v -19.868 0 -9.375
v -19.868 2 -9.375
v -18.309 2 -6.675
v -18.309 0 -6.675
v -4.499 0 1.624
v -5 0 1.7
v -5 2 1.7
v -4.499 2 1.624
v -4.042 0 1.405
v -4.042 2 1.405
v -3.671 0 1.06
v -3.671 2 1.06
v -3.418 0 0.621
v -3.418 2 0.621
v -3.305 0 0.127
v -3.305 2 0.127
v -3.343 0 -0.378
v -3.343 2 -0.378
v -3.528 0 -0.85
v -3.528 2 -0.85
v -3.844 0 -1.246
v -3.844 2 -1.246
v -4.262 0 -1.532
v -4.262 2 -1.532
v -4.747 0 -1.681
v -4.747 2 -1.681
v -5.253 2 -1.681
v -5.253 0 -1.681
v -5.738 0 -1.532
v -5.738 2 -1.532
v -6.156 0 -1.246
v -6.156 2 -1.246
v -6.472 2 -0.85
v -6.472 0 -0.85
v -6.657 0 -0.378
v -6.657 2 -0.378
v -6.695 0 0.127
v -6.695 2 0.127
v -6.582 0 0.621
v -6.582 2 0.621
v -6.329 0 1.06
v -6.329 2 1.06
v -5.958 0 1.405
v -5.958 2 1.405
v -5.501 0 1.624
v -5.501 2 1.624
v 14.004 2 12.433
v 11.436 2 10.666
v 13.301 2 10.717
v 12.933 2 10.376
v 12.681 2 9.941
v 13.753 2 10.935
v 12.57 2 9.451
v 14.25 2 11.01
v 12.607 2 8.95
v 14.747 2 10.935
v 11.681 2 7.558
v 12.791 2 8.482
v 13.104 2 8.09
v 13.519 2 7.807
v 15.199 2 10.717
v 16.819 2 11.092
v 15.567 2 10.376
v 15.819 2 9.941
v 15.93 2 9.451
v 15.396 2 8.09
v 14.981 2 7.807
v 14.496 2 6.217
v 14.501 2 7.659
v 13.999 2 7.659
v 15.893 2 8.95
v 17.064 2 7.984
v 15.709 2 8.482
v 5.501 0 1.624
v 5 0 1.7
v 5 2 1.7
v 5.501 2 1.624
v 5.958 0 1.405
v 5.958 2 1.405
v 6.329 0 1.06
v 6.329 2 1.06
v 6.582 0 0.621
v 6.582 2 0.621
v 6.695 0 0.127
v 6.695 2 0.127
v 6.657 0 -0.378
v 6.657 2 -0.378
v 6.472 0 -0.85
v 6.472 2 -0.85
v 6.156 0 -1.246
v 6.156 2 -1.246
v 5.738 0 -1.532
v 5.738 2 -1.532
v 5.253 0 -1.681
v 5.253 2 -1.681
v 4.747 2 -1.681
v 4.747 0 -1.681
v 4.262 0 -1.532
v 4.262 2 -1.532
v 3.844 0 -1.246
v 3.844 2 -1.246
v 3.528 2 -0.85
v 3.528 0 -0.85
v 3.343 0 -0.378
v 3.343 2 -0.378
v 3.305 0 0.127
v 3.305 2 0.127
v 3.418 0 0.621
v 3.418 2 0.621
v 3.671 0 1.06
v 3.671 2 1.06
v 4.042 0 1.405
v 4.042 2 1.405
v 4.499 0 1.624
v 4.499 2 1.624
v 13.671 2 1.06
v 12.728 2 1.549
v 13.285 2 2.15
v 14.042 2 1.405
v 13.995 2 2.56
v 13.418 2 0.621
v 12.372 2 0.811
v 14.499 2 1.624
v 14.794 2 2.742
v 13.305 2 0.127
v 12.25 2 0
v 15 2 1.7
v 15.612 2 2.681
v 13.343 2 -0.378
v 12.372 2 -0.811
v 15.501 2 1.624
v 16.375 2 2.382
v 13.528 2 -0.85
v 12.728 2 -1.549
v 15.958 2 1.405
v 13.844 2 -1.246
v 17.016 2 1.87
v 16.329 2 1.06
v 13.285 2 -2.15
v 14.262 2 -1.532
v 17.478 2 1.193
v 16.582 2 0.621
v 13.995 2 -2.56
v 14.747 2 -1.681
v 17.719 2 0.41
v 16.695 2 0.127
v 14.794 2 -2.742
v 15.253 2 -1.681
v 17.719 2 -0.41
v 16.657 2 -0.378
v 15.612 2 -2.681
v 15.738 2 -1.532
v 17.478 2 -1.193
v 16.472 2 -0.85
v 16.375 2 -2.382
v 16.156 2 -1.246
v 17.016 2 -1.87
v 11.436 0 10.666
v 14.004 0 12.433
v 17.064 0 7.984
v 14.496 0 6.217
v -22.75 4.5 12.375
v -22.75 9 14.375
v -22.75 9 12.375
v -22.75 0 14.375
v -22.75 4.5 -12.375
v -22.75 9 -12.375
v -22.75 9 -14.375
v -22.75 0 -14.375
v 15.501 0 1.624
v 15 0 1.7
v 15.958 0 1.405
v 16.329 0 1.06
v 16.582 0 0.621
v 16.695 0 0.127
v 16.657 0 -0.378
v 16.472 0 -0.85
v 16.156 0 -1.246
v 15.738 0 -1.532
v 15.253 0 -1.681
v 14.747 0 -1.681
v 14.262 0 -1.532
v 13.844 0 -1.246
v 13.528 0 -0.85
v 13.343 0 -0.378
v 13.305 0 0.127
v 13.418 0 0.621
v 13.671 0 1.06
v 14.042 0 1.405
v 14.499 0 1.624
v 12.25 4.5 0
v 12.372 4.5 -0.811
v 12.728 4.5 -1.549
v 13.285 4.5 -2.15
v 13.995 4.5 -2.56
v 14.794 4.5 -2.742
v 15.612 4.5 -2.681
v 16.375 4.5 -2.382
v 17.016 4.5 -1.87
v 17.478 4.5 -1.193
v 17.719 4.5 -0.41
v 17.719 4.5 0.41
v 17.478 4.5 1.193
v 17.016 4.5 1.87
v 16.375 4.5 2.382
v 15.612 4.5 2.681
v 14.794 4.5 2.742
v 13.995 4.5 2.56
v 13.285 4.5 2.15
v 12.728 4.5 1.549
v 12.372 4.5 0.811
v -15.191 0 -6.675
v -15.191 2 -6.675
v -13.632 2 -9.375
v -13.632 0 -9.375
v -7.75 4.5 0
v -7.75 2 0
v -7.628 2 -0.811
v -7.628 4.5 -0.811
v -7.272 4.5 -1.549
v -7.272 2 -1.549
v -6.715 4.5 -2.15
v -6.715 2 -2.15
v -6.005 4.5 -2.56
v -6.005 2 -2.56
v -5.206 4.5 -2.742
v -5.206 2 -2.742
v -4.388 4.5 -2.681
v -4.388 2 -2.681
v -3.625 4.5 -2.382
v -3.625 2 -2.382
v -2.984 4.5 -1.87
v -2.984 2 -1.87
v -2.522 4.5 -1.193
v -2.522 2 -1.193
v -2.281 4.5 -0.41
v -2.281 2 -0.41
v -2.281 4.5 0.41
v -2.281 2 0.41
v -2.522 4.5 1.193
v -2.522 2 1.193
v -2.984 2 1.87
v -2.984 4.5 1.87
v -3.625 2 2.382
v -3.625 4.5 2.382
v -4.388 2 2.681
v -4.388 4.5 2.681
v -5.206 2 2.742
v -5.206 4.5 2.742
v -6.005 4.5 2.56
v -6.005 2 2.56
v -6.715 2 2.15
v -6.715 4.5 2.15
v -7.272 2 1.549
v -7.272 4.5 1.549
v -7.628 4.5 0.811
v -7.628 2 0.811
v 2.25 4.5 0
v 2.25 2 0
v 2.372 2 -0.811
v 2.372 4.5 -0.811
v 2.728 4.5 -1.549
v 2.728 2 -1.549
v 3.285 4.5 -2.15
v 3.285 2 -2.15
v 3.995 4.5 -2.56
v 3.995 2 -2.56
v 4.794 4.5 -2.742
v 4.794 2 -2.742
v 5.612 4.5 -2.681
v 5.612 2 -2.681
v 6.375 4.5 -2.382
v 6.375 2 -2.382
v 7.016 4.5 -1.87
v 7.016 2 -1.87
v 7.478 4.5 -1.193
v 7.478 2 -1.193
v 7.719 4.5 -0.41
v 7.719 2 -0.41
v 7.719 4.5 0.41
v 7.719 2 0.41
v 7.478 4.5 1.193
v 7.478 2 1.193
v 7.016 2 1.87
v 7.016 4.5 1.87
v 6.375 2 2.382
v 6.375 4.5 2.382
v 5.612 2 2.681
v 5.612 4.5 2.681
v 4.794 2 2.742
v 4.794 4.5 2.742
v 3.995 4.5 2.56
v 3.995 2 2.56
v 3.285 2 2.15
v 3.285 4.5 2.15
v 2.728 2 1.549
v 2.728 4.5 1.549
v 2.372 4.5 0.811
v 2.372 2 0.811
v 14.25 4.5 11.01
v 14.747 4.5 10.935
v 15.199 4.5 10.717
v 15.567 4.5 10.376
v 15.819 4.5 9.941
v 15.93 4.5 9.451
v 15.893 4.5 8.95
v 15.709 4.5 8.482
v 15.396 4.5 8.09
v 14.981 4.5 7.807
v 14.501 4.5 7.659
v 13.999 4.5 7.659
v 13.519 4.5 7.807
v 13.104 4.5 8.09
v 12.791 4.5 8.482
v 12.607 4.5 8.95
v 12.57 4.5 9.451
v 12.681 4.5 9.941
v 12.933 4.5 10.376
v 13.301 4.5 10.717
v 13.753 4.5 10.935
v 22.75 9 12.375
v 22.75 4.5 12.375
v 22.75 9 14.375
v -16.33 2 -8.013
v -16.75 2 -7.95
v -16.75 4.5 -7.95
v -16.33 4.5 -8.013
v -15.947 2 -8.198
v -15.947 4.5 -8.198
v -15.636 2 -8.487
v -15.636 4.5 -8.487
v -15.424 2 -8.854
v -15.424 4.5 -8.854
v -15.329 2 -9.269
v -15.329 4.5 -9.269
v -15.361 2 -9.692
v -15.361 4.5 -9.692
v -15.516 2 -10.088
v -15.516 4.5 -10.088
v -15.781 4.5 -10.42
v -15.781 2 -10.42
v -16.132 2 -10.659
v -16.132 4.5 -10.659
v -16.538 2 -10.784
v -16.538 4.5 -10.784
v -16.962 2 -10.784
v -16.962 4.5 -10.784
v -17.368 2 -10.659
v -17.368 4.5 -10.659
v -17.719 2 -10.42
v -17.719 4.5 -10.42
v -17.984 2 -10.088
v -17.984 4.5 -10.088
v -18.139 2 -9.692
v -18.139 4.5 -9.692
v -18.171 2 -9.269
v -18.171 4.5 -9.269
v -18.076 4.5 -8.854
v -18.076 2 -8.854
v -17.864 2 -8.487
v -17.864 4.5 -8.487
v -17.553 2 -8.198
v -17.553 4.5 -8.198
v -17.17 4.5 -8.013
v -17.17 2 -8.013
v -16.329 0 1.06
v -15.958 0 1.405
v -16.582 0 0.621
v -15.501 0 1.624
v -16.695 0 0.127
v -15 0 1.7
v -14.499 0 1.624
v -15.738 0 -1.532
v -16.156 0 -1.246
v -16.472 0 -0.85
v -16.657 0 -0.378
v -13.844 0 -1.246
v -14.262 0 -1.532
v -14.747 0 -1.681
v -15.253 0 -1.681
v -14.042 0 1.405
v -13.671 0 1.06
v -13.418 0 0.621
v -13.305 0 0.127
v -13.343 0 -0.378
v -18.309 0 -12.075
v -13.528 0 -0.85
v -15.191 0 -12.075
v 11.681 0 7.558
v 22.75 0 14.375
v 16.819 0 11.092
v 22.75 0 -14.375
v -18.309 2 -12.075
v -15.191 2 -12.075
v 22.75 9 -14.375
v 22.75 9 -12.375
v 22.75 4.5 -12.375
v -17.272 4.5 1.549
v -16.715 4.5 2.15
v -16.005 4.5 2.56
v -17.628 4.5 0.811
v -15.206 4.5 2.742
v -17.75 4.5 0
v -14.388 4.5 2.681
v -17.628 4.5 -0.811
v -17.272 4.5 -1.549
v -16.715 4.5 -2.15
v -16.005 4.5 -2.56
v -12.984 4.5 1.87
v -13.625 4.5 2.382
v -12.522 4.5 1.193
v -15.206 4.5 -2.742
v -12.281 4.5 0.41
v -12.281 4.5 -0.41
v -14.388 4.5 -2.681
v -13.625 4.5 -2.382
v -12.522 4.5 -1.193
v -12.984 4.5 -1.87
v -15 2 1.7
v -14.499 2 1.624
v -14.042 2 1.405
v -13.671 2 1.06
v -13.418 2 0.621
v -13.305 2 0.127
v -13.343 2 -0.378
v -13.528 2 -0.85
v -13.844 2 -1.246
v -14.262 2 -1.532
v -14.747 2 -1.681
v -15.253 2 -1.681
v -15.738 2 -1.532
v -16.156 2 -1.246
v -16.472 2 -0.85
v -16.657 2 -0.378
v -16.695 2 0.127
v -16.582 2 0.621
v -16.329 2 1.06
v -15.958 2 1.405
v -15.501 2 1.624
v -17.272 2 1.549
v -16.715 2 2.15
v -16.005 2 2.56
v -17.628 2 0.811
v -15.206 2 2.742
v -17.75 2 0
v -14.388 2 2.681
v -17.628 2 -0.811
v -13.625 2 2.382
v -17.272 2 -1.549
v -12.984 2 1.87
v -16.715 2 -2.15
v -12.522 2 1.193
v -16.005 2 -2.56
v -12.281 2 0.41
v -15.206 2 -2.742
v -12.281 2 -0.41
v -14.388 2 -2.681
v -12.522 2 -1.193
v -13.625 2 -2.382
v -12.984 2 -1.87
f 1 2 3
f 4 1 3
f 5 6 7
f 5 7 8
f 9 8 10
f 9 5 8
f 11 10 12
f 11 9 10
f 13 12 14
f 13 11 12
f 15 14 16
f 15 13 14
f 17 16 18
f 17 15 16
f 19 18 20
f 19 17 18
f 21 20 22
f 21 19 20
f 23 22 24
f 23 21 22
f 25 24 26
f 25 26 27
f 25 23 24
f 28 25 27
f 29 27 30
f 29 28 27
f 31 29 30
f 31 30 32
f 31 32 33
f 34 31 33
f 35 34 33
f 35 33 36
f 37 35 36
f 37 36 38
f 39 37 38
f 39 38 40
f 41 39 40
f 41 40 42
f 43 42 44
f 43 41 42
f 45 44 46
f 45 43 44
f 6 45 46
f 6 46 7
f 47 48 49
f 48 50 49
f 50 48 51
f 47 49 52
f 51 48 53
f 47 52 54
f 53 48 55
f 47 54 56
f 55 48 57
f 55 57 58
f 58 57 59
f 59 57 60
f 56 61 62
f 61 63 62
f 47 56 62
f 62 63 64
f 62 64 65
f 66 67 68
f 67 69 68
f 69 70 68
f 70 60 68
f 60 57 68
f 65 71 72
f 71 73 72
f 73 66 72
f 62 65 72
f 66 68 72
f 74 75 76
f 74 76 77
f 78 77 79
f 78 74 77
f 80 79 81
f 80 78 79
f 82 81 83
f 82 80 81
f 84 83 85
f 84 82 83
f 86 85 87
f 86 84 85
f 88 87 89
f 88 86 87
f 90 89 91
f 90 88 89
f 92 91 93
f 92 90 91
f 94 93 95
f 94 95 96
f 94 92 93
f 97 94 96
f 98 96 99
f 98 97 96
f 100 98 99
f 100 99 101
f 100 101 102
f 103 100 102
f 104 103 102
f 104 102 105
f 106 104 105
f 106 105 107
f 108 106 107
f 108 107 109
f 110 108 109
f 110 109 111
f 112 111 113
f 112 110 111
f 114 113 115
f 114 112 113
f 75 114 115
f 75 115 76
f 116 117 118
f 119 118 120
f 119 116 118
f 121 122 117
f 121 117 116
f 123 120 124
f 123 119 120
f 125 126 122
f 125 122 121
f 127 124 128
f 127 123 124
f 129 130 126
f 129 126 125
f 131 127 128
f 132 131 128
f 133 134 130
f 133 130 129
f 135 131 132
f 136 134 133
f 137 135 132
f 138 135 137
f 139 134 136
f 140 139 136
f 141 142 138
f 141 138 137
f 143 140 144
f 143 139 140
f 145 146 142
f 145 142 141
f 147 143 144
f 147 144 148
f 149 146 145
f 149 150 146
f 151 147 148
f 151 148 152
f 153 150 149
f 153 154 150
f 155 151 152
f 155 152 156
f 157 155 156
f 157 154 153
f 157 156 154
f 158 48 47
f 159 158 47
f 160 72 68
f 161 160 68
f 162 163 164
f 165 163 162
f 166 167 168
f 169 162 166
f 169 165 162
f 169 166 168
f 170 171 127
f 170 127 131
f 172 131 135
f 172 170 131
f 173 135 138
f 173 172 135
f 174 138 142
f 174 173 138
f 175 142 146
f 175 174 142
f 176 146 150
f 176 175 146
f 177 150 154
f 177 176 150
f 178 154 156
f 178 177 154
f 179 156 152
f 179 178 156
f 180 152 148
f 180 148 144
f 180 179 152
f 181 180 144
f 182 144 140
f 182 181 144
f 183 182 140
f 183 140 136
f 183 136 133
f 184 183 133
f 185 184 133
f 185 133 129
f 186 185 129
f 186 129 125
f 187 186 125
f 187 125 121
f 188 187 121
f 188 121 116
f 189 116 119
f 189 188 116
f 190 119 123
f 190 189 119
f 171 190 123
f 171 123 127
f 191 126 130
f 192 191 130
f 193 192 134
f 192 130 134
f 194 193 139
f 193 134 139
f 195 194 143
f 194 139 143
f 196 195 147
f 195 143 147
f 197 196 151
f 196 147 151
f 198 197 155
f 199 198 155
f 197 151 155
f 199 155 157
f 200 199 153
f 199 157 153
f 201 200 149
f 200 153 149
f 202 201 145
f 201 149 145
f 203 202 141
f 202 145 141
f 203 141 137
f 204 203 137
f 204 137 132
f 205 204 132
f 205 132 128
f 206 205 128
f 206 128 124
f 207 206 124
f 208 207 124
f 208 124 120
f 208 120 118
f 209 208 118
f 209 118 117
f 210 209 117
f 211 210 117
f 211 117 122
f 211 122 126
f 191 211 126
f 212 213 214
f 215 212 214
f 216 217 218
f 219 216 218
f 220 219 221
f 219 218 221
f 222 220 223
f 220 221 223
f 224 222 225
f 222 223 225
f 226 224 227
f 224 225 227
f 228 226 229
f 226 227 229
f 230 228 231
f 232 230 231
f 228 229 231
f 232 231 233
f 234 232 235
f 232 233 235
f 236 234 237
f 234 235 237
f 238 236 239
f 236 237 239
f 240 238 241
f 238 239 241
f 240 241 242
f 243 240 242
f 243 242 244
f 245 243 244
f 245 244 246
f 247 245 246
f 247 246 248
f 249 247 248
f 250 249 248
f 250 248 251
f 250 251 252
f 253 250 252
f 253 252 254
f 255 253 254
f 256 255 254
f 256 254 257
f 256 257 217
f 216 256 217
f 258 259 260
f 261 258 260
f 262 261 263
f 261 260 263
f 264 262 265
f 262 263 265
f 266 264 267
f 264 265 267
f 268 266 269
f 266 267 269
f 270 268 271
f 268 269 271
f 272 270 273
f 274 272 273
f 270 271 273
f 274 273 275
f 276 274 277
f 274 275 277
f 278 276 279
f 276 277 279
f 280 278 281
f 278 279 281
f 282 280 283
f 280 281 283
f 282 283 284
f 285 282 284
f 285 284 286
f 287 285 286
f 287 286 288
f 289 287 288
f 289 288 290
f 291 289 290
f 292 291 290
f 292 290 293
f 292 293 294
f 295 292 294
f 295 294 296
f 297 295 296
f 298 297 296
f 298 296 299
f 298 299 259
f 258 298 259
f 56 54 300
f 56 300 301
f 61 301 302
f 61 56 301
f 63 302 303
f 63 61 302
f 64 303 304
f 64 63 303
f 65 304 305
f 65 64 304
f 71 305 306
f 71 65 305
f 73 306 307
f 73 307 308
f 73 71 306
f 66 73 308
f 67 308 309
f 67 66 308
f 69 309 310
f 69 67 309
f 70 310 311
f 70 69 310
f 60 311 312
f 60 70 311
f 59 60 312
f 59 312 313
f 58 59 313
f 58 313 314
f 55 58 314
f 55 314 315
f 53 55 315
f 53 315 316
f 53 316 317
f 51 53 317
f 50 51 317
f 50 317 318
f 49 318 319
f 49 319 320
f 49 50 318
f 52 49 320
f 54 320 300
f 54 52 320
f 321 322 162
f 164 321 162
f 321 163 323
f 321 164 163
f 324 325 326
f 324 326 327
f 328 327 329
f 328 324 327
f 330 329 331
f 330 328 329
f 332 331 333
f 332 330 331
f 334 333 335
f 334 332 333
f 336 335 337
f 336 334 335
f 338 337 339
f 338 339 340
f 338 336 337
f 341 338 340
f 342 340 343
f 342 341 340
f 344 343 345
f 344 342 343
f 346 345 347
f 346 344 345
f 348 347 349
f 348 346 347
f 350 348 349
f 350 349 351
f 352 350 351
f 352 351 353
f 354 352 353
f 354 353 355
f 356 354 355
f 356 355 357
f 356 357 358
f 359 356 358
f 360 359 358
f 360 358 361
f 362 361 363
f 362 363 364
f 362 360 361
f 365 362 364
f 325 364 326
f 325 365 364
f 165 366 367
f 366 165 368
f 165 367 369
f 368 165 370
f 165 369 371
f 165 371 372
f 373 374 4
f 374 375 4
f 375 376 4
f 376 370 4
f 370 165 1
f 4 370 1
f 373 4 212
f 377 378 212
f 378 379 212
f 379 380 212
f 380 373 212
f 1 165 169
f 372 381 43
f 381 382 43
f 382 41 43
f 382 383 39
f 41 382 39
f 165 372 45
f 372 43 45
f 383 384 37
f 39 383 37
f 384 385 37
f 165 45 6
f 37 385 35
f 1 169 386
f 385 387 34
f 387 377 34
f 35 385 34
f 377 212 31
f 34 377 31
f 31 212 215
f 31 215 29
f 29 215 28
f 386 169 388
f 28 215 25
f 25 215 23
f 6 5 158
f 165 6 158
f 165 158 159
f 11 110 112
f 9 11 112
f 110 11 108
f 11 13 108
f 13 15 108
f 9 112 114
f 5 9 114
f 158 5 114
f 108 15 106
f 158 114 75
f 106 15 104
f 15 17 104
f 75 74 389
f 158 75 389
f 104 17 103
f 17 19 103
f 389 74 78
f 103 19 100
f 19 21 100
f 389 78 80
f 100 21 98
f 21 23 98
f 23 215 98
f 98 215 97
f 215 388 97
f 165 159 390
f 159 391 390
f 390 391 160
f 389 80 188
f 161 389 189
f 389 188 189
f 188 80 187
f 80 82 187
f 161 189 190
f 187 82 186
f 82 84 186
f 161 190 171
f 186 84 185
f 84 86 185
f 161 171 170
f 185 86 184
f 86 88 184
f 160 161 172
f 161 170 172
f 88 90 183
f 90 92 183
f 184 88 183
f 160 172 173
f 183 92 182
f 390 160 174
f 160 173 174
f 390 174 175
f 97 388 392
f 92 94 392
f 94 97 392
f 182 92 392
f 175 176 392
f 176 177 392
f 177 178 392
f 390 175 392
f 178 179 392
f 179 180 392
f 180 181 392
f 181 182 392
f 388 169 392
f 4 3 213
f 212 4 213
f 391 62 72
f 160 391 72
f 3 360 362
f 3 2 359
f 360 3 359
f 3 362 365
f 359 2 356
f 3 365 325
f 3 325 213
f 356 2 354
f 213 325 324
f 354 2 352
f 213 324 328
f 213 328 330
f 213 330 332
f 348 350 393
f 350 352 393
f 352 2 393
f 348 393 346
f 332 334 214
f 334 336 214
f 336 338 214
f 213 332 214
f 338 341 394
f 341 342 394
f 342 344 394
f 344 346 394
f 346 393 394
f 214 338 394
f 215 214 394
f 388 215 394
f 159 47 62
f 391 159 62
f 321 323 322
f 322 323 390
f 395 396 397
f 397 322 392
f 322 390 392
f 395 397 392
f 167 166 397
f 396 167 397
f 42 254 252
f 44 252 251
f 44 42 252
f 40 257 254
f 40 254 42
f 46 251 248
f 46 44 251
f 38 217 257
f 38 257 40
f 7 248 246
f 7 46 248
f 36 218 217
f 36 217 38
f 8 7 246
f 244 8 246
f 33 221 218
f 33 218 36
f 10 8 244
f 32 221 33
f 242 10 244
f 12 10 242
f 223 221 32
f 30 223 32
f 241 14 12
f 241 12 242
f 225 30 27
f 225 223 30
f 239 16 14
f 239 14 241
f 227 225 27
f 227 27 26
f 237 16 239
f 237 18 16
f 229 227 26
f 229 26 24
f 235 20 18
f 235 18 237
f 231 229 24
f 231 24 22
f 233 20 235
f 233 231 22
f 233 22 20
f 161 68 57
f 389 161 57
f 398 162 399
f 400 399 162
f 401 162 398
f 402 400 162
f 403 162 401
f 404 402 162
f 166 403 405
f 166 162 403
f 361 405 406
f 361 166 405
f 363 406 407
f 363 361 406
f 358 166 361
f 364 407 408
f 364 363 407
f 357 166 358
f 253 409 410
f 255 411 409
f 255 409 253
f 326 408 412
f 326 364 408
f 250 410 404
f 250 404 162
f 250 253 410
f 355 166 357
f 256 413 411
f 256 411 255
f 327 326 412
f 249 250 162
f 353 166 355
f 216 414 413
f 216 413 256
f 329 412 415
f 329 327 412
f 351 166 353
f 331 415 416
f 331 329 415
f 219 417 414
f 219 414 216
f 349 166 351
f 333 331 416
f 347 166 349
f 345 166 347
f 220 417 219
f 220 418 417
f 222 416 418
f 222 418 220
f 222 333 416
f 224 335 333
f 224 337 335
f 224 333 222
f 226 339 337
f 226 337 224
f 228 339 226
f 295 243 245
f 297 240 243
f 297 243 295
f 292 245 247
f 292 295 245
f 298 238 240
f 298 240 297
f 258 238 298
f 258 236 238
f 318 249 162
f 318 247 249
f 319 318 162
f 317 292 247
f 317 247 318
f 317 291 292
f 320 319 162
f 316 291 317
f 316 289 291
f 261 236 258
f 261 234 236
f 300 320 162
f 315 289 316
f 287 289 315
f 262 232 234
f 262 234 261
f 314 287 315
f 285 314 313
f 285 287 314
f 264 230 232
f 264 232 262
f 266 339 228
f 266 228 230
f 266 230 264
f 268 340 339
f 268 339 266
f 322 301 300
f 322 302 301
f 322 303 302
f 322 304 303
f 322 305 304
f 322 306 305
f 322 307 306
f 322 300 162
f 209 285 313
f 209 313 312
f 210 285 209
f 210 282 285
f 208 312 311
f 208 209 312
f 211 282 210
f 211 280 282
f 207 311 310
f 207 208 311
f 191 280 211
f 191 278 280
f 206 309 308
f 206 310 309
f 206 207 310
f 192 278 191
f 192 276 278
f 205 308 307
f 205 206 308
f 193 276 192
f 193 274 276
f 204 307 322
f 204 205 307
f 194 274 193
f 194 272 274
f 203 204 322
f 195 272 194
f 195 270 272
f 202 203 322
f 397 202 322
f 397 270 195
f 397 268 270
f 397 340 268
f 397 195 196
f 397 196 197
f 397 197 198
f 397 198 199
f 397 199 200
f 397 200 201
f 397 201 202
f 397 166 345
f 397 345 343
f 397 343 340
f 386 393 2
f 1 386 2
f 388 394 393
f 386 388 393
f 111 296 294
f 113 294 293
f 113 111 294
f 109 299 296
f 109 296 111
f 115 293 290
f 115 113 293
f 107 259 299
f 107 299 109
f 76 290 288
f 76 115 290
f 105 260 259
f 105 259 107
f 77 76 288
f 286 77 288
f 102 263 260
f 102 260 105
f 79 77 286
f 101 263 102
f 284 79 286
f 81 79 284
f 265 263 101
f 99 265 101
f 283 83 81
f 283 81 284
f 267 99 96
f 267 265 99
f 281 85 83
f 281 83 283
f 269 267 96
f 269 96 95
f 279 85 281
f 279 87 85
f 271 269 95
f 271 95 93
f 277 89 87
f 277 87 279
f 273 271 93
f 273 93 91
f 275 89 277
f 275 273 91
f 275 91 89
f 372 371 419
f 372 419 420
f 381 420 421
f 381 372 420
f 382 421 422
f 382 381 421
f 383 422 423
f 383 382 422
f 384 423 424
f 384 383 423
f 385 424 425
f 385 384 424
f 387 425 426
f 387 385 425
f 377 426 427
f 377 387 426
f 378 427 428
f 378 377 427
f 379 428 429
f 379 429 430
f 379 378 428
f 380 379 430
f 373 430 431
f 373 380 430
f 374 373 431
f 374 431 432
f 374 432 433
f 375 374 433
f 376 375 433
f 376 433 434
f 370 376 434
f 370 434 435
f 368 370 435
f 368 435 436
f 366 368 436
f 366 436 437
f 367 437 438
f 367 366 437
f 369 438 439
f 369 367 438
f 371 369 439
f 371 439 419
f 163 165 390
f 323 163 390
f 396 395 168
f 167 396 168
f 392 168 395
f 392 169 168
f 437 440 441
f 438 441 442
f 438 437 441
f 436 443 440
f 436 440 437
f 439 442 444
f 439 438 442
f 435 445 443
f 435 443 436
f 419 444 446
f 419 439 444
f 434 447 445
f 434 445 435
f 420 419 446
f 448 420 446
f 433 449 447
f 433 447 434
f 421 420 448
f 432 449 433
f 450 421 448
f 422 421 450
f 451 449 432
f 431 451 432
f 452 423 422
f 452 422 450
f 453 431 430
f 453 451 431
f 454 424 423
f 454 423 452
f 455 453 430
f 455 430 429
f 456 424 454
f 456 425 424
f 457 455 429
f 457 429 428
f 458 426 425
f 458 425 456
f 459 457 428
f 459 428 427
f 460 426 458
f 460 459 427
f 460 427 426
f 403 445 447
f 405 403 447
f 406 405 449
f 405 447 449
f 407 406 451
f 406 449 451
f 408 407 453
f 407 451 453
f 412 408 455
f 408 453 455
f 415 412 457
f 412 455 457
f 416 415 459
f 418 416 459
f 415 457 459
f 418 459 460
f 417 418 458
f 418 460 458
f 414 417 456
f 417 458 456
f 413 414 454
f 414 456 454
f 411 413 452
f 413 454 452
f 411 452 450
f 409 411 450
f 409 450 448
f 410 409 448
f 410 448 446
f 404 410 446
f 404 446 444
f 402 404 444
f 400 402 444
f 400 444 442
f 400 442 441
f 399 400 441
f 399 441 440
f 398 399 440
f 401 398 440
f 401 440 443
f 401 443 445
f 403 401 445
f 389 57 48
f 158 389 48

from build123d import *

# Parameters (mm, degrees)
SKETCH1_W           = 45.5
SKETCH1_H           = 28.75
SKETCH1_R           = 1.7
BOSS_EXTRUDE1_DEPTH = 2
BOSS_EXTRUDE2_DEPTH = 7
SKETCH3_W           = 45.5
SKETCH3_H           = 8
SKETCH3_R           = 1.425
SKETCH3_R_2         = 1.685028189
BOSS_EXTRUDE3_DEPTH = 2.5
CUT_EXTRUDE1_REACH  = 29.807


with BuildPart() as part:
    # Sketch1 → Boss-Extrude1 (new body)
    with BuildSketch(Plane(origin=(0, 0, 0), x_dir=(1, 0, 0), z_dir=(0, 1, 0))):
        Rectangle(SKETCH1_W, SKETCH1_H)
        with Locations(Location((-15, 0, 0), (0, 0, 270))):
            Circle(SKETCH1_R, mode=Mode.SUBTRACT)
        with Locations(Location((-5, 0, 0), (0, 0, 270))):
            Circle(SKETCH1_R, mode=Mode.SUBTRACT)
        with Locations(Location((5, 0, 0), (0, 0, 270))):
            Circle(SKETCH1_R, mode=Mode.SUBTRACT)
        with Locations(Location((15, 0, 0), (0, 0, 270))):
            Circle(SKETCH1_R, mode=Mode.SUBTRACT)
    extrude(amount=BOSS_EXTRUDE1_DEPTH)

    # Sketch2 → Boss-Extrude2 (add)
    with BuildSketch(Plane(origin=(0, 2, 0), x_dir=(1, 0, 0), z_dir=(0, 1, 0))):
        Polygon((-22.75, 14.375), (22.75, 14.375), (22.75, 12.375), (20.75, 12.375), (-20.75, 12.375), (-22.75, 12.375), align=None)
        Polygon((-22.75, -14.375), (22.75, -14.375), (22.75, -12.375), (20.75, -12.375), (-20.75, -12.375), (-22.75, -12.375), align=None)
    extrude(amount=BOSS_EXTRUDE2_DEPTH)

    # Sketch3 → Boss-Extrude3 (add)
    # profile 1 of 4: a face of its own
    with BuildSketch(Plane(origin=(0, 2, 0), x_dir=(1, 0, 0), z_dir=(0, 1, 0))):
        with Locations((0, 8.375)):
            Rectangle(SKETCH3_W, SKETCH3_H)
        with Locations(Location((-16.75, 9.375, 0), (0, 0, 270))):
            Circle(SKETCH3_R, mode=Mode.SUBTRACT)
    # profile 2 of 4: a face of its own
    with BuildSketch(Plane(origin=(0, 2, 0), x_dir=(1, 0, 0), z_dir=(0, 1, 0))):
        with BuildLine():
            Line((22.75, 4.375), (-22.75, 4.375))
            Line((-22.75, 4.375), (-22.75, 0))
            Line((-22.75, 0), (-17.75, 0))
            ThreePointArc((-17.75, 0), (-15, 2.75), (-12.25, 0))
            Line((-12.25, 0), (-7.75, 0))
            ThreePointArc((-7.75, 0), (-5, 2.75), (-2.25, 0))
            Line((-2.25, 0), (2.25, 0))
            ThreePointArc((2.25, 0), (5, 2.75), (7.75, 0))
            Line((7.75, 0), (12.25, 0))
            ThreePointArc((12.25, 0), (15, 2.75), (17.75, 0))
            Line((17.75, 0), (22.75, 0))
            Line((22.75, 0), (22.75, 4.375))
        make_face()
    # profile 3 of 4: a face of its own
    with BuildSketch(Plane(origin=(0, 2, 0), x_dir=(1, 0, 0), z_dir=(0, 1, 0))):
        with BuildLine():
            Line((-17.75, 0), (-22.75, 0))
            Line((-22.75, 0), (-22.75, -4.375))
            Line((-22.75, -4.375), (22.75, -4.375))
            Line((22.75, -4.375), (22.75, 0))
            Line((22.75, 0), (17.75, 0))
            ThreePointArc((17.75, 0), (15, -2.75), (12.25, 0))
            Line((12.25, 0), (7.75, 0))
            ThreePointArc((7.75, 0), (5, -2.75), (2.25, 0))
            Line((2.25, 0), (-2.25, 0))
            ThreePointArc((-2.25, 0), (-5, -2.75), (-7.75, 0))
            Line((-7.75, 0), (-12.25, 0))
            ThreePointArc((-12.25, 0), (-15, -2.75), (-17.75, 0))
        make_face()
    # profile 4 of 4: a face of its own
    with BuildSketch(Plane(origin=(0, 2, 0), x_dir=(1, 0, 0), z_dir=(0, 1, 0))):
        with Locations((0, -8.375)):
            Rectangle(SKETCH3_W, SKETCH3_H)
        with Locations(Location((14.25, -9.325, 0), (0, 0, 270))):
            Circle(SKETCH3_R_2, mode=Mode.SUBTRACT)
    extrude(amount=BOSS_EXTRUDE3_DEPTH)

    # Sketch4 → Cut-Extrude1 (cut, up to next)
    with BuildSketch(Plane(origin=(0, 2, 0), x_dir=(1, 0, 0), z_dir=(0, 1, 0)), mode=Mode.PRIVATE) as cut_extrude1_sk1:
        Polygon((-19.867691454, 9.375), (-18.308845727, 6.675), (-15.191154273, 6.675), (-13.632308546, 9.375), (-15.191154273, 12.075), (-18.308845727, 12.075), align=None)
    cut_extrude1_tool1 = extrude(cut_extrude1_sk1.sketch, amount=-CUT_EXTRUDE1_REACH, mode=Mode.PRIVATE) & part.part
    # Sketch4 → Cut-Extrude1 (cut, up to next)
    with BuildSketch(Plane(origin=(0, 2, 0), x_dir=(1, 0, 0), z_dir=(0, 1, 0)), mode=Mode.PRIVATE) as cut_extrude1_sk2:
        Polygon((14.495583037, -6.216995983), (11.681181084, -7.558316843), (11.435598047, -10.66632086), (14.004416963, -12.433004017), (16.818818916, -11.091683157), (17.064401953, -7.98367914), align=None)
    cut_extrude1_tool2 = extrude(cut_extrude1_sk2.sketch, amount=-CUT_EXTRUDE1_REACH, mode=Mode.PRIVATE) & part.part
    add(cut_extrude1_tool1.solids().sort_by_distance((-16.75, 2, -9.375))[0], mode=Mode.SUBTRACT)
    add(cut_extrude1_tool2.solids().sort_by_distance((14.25, 2, 9.325))[0], mode=Mode.SUBTRACT)


solid = part.part
